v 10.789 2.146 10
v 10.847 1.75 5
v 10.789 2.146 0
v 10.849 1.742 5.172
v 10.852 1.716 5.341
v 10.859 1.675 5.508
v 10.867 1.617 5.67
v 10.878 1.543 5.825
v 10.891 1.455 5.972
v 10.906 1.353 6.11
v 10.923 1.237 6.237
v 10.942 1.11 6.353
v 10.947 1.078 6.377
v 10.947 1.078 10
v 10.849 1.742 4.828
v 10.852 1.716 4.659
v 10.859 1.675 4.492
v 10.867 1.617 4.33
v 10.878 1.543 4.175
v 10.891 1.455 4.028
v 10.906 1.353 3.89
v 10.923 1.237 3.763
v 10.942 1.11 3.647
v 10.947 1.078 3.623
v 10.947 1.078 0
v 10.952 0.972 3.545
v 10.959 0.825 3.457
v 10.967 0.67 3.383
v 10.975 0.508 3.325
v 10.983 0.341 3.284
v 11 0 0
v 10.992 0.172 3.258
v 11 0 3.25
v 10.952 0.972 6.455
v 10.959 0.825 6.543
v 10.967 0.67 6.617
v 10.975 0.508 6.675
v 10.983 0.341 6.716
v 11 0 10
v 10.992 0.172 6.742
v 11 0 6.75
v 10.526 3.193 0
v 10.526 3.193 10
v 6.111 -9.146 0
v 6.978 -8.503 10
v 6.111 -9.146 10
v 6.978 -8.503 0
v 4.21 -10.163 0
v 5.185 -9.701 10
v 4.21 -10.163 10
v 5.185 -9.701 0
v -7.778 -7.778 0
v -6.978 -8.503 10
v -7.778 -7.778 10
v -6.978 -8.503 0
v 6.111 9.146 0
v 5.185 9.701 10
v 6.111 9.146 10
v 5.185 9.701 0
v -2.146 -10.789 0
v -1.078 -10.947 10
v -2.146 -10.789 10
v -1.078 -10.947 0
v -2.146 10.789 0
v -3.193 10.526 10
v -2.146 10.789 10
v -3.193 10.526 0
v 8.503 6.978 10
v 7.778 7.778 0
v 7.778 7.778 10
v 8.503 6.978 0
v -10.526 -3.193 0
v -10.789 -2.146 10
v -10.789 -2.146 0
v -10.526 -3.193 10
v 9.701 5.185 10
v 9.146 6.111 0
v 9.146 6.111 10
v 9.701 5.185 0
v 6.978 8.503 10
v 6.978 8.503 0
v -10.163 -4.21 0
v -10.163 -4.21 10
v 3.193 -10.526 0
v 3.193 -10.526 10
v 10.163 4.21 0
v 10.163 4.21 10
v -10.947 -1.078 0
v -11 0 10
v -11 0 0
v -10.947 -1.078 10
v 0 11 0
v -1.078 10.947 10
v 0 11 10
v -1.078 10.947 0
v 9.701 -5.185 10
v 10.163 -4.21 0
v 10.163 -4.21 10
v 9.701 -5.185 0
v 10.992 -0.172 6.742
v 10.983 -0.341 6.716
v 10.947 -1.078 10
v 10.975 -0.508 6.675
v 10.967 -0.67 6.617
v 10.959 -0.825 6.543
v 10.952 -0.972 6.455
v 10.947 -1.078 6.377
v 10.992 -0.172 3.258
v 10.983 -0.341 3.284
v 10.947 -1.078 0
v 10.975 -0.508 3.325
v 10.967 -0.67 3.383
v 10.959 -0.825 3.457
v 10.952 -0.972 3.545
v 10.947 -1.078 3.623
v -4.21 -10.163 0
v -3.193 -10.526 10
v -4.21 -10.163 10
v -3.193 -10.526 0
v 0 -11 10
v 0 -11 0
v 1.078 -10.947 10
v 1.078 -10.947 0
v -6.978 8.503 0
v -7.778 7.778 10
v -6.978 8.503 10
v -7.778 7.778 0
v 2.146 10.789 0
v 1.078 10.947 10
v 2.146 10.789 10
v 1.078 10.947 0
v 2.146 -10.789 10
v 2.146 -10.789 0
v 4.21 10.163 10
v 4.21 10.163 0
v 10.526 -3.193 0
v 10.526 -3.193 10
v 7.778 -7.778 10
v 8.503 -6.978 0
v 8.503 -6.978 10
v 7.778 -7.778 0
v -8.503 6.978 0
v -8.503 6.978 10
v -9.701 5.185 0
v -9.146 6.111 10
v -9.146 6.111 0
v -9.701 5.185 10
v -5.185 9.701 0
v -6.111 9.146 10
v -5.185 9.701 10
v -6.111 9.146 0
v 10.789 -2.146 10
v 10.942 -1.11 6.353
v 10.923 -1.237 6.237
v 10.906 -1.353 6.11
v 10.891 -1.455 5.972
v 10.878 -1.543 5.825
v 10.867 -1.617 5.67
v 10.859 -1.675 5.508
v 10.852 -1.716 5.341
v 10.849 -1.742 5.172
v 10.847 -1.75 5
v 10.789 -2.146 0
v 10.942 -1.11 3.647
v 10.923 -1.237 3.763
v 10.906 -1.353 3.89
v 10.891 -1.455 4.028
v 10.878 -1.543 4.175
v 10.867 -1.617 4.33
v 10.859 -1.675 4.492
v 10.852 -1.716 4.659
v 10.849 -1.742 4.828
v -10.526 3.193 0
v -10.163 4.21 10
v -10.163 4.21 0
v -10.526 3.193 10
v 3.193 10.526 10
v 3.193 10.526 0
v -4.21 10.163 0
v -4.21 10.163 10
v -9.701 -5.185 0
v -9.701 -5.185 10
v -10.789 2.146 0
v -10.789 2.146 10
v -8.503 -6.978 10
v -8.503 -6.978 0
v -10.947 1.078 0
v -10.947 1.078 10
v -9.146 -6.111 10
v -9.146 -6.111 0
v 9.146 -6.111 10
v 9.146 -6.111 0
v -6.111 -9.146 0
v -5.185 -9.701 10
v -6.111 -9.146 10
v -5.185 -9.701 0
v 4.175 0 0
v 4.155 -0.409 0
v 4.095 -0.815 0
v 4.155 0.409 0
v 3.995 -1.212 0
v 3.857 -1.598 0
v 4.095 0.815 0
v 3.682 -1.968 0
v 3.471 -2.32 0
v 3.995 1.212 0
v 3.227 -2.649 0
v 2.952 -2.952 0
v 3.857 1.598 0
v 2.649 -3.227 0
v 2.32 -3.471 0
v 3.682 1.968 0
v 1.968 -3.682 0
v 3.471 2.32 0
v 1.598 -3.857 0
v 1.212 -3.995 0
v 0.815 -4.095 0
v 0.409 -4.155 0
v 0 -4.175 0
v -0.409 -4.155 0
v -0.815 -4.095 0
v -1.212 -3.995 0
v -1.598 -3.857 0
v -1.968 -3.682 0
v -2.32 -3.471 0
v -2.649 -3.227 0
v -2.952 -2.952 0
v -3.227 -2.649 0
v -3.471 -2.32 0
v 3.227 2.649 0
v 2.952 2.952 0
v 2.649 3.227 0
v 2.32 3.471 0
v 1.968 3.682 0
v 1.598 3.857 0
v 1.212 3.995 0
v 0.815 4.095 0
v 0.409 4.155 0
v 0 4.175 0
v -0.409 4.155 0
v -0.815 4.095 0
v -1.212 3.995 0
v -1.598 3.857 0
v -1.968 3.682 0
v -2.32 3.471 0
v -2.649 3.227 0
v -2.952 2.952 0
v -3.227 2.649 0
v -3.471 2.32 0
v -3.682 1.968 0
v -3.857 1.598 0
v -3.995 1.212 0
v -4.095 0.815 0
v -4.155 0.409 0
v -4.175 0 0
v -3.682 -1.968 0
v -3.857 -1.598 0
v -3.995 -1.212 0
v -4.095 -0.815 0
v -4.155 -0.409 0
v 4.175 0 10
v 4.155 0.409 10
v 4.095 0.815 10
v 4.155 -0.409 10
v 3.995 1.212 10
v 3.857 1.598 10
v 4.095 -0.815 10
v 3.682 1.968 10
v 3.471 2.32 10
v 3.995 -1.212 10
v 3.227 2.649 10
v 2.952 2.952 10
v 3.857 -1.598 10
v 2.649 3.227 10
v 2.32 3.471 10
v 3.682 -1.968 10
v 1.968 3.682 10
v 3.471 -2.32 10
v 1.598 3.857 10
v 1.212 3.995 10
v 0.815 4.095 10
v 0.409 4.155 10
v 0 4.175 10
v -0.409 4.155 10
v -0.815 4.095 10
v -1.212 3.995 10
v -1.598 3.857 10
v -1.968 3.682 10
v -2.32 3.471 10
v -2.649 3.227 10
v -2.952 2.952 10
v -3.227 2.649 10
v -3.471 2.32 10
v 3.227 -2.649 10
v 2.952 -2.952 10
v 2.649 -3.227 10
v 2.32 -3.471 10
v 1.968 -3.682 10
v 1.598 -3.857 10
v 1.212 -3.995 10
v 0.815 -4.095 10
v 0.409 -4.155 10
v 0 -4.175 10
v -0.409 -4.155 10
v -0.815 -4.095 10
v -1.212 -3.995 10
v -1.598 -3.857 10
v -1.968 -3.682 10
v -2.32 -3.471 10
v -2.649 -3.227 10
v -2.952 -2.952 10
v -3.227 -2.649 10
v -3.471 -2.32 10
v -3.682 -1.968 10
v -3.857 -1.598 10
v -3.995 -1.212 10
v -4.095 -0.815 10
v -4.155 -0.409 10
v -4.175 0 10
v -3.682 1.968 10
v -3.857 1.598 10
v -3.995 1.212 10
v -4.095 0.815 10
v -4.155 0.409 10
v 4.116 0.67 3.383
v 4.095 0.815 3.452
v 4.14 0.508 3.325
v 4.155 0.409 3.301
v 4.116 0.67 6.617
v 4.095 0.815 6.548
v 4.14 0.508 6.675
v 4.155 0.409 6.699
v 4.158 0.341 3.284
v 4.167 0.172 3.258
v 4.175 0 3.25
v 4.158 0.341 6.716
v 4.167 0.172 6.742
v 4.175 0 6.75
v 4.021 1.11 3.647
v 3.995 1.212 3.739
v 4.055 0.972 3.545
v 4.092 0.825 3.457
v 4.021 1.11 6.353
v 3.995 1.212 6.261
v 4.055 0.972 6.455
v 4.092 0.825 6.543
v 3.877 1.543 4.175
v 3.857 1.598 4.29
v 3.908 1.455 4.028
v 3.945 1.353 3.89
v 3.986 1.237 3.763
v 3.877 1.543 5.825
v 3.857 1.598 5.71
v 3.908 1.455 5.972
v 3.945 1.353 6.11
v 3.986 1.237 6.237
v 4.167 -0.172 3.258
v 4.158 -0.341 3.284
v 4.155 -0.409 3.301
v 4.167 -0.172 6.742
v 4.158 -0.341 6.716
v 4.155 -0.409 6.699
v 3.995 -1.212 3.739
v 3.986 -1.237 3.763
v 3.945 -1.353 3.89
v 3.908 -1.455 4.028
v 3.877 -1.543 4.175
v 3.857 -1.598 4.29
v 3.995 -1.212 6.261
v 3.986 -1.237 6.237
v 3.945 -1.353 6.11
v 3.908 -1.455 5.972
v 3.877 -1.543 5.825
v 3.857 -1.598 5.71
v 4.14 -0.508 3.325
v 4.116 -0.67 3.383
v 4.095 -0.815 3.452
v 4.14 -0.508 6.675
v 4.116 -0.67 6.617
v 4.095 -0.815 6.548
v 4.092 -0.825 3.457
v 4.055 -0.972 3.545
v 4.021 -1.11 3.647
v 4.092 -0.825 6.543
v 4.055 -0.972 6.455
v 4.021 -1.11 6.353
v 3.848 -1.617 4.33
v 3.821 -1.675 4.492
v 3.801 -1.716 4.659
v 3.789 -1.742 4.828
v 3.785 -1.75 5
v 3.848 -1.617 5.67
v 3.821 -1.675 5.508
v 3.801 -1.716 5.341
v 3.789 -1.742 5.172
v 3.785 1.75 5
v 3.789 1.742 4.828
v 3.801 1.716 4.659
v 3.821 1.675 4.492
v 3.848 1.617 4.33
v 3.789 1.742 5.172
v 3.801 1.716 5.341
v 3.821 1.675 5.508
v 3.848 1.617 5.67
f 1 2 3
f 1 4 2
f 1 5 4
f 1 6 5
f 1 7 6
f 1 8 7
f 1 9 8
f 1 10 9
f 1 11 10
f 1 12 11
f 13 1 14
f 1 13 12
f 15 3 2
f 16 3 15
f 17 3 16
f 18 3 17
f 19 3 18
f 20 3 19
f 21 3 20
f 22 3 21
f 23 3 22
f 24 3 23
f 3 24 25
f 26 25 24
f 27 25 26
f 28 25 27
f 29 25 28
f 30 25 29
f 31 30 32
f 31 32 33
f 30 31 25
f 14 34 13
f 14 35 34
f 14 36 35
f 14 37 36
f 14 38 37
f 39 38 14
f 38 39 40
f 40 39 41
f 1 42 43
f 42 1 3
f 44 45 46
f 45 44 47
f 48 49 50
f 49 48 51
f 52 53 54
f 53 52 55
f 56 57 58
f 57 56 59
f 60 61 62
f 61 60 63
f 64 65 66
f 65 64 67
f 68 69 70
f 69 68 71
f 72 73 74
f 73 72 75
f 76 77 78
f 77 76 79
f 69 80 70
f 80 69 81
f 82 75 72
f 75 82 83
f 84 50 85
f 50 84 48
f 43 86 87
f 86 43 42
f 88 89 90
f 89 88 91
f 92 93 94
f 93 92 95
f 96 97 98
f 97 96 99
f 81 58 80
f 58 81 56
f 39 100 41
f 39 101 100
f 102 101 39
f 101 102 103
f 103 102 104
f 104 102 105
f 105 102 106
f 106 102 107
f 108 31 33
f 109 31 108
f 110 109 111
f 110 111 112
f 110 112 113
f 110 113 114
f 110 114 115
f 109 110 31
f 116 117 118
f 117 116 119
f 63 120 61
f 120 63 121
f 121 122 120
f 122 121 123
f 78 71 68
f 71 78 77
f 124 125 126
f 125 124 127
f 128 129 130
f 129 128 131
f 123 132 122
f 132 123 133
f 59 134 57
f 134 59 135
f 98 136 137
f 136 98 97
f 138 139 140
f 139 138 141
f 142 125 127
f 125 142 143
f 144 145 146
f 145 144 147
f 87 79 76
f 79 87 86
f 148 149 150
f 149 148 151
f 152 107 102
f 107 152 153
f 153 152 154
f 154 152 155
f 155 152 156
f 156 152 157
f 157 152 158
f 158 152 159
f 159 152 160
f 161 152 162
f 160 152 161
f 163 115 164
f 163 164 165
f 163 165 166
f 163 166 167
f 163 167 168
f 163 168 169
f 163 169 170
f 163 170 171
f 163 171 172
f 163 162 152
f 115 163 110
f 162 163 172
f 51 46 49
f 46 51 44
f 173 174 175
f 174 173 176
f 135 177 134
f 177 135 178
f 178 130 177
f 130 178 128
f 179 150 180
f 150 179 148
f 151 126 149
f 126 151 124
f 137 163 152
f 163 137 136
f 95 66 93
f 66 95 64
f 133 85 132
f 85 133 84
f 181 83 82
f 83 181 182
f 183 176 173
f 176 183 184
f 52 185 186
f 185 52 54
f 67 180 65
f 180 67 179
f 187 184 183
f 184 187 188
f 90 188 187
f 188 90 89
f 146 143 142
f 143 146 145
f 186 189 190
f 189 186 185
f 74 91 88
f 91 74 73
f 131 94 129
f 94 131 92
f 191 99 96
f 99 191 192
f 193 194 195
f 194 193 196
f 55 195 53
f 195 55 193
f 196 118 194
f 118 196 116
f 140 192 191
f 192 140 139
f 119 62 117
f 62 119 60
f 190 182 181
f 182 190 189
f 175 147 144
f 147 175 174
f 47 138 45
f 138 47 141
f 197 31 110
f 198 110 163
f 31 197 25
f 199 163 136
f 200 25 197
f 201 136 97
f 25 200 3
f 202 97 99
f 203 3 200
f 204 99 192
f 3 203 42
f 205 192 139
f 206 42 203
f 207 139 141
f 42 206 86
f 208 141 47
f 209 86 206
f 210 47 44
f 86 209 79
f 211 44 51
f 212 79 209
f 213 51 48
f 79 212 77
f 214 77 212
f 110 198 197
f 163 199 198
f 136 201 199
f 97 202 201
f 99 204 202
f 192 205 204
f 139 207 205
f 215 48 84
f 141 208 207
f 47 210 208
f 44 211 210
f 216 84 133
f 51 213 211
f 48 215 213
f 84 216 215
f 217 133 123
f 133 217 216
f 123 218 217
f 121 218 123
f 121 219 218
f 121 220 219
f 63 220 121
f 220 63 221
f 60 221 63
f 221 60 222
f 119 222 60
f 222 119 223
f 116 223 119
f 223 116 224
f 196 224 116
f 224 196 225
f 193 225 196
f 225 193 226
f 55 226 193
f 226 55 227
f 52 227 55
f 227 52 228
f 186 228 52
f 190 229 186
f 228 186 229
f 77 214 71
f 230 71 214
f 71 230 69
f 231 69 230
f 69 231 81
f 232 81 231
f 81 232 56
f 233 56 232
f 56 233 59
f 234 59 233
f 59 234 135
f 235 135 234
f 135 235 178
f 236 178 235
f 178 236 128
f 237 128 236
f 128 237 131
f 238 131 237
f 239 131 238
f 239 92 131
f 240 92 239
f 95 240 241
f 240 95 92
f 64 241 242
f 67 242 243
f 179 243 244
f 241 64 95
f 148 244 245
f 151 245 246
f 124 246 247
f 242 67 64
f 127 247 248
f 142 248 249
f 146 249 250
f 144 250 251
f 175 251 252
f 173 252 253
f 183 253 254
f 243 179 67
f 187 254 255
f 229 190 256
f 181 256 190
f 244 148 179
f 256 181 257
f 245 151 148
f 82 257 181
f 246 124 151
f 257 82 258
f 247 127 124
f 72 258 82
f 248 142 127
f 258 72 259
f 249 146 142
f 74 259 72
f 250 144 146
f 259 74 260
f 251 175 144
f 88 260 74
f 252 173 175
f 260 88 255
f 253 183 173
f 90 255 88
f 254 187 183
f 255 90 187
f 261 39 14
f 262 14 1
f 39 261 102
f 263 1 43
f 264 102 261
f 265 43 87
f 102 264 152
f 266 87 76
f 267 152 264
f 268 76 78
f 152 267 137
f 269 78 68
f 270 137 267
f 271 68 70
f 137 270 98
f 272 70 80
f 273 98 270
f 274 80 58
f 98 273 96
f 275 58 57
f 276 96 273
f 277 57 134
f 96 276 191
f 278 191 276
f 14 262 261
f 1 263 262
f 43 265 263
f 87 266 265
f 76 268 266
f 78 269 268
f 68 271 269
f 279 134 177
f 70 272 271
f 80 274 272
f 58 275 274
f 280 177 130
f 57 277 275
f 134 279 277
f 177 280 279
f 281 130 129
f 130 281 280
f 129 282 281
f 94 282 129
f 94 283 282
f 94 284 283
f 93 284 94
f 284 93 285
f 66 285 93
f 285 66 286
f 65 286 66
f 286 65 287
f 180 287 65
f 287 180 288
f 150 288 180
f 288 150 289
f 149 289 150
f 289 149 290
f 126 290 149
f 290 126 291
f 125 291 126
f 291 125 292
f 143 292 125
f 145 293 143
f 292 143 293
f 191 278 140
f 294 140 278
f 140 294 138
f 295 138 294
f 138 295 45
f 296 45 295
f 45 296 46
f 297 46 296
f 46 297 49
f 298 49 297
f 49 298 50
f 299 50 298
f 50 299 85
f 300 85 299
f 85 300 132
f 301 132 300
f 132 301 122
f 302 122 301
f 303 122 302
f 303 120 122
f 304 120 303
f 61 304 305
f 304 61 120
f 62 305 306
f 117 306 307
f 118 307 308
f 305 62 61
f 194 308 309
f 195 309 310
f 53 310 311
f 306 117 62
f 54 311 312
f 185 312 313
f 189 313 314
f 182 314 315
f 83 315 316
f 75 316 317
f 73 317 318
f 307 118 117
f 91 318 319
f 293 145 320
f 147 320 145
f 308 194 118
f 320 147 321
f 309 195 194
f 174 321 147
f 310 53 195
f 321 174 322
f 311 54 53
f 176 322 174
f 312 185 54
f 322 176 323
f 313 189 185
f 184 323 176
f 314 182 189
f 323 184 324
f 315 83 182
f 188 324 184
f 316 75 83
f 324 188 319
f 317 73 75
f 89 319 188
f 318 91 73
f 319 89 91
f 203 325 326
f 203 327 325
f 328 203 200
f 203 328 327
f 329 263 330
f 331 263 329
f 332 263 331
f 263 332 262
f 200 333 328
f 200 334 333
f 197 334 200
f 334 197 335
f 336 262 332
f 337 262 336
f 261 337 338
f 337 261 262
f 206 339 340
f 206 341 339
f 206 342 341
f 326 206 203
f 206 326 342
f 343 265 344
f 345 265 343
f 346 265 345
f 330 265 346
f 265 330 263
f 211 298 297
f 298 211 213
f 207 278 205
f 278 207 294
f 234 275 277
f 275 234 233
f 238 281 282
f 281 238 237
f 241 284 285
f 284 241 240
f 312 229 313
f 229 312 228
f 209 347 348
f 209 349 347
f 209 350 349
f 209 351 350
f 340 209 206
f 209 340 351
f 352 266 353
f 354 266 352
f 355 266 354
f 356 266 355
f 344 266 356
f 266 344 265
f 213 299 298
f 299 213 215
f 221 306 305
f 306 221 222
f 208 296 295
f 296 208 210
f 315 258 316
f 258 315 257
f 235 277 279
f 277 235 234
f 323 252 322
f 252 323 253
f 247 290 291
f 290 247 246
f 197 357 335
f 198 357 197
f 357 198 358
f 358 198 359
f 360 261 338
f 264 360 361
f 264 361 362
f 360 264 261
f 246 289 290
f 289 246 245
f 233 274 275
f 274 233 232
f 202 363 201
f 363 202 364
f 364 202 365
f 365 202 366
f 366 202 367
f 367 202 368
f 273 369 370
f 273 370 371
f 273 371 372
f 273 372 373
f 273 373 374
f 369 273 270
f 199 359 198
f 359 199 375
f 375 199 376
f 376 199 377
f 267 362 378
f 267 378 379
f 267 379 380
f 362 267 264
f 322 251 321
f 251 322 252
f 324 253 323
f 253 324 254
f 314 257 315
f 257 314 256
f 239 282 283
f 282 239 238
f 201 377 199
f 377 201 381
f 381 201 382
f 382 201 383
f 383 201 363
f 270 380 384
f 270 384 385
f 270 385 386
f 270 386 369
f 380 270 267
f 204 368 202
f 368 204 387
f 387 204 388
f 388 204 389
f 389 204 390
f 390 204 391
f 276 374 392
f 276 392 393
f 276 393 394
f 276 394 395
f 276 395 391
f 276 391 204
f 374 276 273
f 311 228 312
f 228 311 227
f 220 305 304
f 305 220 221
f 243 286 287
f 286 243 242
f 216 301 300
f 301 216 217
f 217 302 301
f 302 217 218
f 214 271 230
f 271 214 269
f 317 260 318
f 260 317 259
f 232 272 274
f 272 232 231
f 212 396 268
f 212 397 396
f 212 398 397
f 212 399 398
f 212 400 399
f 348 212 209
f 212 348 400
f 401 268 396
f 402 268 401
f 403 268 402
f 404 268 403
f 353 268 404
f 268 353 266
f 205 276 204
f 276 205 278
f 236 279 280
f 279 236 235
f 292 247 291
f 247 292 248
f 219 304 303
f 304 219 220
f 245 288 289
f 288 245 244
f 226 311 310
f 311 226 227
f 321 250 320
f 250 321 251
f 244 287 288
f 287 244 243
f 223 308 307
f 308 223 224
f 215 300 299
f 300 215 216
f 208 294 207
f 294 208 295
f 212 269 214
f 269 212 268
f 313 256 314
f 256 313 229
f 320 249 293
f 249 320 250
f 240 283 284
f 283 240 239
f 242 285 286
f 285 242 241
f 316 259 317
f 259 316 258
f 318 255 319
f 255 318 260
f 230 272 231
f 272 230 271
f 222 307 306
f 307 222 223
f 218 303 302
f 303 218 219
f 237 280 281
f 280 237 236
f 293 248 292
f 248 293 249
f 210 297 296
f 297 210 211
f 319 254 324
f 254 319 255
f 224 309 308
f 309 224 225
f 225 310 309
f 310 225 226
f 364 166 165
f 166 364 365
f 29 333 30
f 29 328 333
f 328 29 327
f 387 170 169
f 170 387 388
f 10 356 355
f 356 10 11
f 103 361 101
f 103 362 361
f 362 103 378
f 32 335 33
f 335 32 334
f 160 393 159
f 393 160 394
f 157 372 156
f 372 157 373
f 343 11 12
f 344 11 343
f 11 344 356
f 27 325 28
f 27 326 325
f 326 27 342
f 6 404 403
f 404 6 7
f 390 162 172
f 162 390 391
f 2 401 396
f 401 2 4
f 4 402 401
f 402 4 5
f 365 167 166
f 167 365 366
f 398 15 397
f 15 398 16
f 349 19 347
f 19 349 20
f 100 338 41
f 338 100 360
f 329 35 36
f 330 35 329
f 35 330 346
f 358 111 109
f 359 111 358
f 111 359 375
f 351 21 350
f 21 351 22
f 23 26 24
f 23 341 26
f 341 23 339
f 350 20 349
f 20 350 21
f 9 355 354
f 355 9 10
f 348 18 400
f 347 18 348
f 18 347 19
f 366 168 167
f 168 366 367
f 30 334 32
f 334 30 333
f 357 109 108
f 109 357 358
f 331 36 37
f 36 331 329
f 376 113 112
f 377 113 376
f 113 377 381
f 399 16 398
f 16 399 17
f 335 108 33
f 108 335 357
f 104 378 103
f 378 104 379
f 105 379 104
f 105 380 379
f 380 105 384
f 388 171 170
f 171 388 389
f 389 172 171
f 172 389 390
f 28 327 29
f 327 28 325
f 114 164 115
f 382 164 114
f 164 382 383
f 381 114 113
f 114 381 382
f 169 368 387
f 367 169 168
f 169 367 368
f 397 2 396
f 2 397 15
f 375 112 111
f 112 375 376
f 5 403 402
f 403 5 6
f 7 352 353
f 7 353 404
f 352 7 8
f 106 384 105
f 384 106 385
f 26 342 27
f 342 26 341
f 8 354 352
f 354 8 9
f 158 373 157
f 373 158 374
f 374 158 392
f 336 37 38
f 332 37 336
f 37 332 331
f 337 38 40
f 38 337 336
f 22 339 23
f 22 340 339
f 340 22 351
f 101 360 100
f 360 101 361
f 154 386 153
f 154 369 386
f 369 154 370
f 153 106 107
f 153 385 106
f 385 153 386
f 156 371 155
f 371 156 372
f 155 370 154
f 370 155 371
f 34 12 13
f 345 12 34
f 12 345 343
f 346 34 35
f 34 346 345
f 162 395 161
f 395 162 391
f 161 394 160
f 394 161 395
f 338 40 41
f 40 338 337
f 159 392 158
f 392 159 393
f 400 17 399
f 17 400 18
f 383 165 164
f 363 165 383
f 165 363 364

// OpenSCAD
// file: parameters.scad
// =============================================================================
// Gen-AZ Dual-rotor copper-centroid femto AFPM - WOUND-AWARE (HARD GATE)
// PRIMARY challenger vs Gen-AW. Magnets @ R=37.5 + 220 t + former_web 1.20 -> m2m 4.66.
// =============================================================================

// --- Wire / wind budget (26 AWG, ~1 lb spool ~ 390 m bare-equiv) --------------
wire_awg            = 26;
wire_od             = 0.45;     // insulated OD mm
turns               = 220;      // +5 vs Gen-AW 215
fill                = 0.70;
layers_per_face     = 2;        // axial layers proud of EACH flange
wind_build_axial    = layers_per_face * wire_od * fill;   // 0.63 mm
wind_build_radial   = 3 * wire_od * fill;                 // 0.945 mm

// --- Pancake former (bare STL) -----------------------------------------------
coil_id_r           = 13.5;     // copper-centroid window centered ~R=37.5
coil_od_r           = 61.5;
span_deg            = 26.0;     // 12 stations x 30 deg pitch
former_web          = 1.20;     // print floor for LB walls
flange_t            = 0.60;
wall                = 1.2;
slot_w              = 2.4;
mount_hole          = 3.5;
tab_len             = 7.0;

former_bare_h       = former_web + 2 * flange_t;            // 2.40 mm
coil_envelope_h     = former_bare_h + 2 * wind_build_axial; // 3.66 mm

// --- Running clearance (magnet face -> WOUND face) EACH side ------------------
run_clear           = 0.50;     // PASS floor >= 0.5
gap_spacer_h        = run_clear + wind_build_axial;         // 1.13 mm
m2m                 = coil_envelope_h + 2 * run_clear;      // 4.66 mm (holds vs Gen-AW)

// --- Mid stator (12 pancakes 3ph; winds proud both faces) ---------------------
coil_stations       = 12;
bay_r_in            = coil_id_r - 2.0 - wind_build_radial;
bay_r_out           = coil_od_r + 2.0 + wind_build_radial;
bay_span            = span_deg + 4.0;
bay_offset          = 2.0;
stator_thick        = former_bare_h;                        // winds proud +/-Z
stator_od           = 160.0;
shaft_clear_stator  = 33.5;     // nudged inward vs AW 34.0
coil_mount_r        = 24.5;     // nudged inward vs AW 25.0

// --- Rotors (x2) - 8xO20 @ R=37.5 (copper centroid) + 24xO5 Halbach ----------
large_pocket_d      = 20.3;
small_pocket_d      = 5.3;
pocket_h            = 5.2;
large_n             = 8;
R_large             = 37.5;     // covers ~27.5-47.5 over copper centroid ~37.5
R_small_inner       = 22.5;
R_small_mid         = 37.5;
R_small_outer       = 54.5;
carrier_od          = 156.0;
carrier_thick       = 7.5;
hub_h               = 10.0;
hub_od              = 30.0;
rotor_b_offset_deg  = 22.5;

// --- Modular MAX interface (Gen-E family) ------------------------------------
shaft_bore          = 8.35;
bearing_d           = 21.85;
bearing_h           = 7.2;
m3_clear            = 3.5;
bolt_r_inner        = 36.0;
bolt_n_inner        = 6;
flange_bolt_r       = 72.0;
flange_bolt_n       = 6;
brace_r             = 68.0;
brace_d             = 4.3;
brace_n             = 4;

spacer_pad_od       = 14.0;
spacer_pad_id       = m3_clear;
endbell_od          = 160.0;
endbell_thick       = 8.0;
endbell_shaft_clear = 10.0;

$fn = 64;
// main file
// Gen-AW shaft collar — print ×2–4
include <parameters.scad>;
$fn = 64;
od = 22; id = shaft_bore; h = 10; set_d = 3.5;
difference() {
    cylinder(d=od, h=h);
    translate([0, 0, -0.1]) cylinder(d=id, h=h + 0.2);
    translate([0, 0, h/2]) rotate([0, 90, 0]) cylinder(d=set_d, h=od);
}
